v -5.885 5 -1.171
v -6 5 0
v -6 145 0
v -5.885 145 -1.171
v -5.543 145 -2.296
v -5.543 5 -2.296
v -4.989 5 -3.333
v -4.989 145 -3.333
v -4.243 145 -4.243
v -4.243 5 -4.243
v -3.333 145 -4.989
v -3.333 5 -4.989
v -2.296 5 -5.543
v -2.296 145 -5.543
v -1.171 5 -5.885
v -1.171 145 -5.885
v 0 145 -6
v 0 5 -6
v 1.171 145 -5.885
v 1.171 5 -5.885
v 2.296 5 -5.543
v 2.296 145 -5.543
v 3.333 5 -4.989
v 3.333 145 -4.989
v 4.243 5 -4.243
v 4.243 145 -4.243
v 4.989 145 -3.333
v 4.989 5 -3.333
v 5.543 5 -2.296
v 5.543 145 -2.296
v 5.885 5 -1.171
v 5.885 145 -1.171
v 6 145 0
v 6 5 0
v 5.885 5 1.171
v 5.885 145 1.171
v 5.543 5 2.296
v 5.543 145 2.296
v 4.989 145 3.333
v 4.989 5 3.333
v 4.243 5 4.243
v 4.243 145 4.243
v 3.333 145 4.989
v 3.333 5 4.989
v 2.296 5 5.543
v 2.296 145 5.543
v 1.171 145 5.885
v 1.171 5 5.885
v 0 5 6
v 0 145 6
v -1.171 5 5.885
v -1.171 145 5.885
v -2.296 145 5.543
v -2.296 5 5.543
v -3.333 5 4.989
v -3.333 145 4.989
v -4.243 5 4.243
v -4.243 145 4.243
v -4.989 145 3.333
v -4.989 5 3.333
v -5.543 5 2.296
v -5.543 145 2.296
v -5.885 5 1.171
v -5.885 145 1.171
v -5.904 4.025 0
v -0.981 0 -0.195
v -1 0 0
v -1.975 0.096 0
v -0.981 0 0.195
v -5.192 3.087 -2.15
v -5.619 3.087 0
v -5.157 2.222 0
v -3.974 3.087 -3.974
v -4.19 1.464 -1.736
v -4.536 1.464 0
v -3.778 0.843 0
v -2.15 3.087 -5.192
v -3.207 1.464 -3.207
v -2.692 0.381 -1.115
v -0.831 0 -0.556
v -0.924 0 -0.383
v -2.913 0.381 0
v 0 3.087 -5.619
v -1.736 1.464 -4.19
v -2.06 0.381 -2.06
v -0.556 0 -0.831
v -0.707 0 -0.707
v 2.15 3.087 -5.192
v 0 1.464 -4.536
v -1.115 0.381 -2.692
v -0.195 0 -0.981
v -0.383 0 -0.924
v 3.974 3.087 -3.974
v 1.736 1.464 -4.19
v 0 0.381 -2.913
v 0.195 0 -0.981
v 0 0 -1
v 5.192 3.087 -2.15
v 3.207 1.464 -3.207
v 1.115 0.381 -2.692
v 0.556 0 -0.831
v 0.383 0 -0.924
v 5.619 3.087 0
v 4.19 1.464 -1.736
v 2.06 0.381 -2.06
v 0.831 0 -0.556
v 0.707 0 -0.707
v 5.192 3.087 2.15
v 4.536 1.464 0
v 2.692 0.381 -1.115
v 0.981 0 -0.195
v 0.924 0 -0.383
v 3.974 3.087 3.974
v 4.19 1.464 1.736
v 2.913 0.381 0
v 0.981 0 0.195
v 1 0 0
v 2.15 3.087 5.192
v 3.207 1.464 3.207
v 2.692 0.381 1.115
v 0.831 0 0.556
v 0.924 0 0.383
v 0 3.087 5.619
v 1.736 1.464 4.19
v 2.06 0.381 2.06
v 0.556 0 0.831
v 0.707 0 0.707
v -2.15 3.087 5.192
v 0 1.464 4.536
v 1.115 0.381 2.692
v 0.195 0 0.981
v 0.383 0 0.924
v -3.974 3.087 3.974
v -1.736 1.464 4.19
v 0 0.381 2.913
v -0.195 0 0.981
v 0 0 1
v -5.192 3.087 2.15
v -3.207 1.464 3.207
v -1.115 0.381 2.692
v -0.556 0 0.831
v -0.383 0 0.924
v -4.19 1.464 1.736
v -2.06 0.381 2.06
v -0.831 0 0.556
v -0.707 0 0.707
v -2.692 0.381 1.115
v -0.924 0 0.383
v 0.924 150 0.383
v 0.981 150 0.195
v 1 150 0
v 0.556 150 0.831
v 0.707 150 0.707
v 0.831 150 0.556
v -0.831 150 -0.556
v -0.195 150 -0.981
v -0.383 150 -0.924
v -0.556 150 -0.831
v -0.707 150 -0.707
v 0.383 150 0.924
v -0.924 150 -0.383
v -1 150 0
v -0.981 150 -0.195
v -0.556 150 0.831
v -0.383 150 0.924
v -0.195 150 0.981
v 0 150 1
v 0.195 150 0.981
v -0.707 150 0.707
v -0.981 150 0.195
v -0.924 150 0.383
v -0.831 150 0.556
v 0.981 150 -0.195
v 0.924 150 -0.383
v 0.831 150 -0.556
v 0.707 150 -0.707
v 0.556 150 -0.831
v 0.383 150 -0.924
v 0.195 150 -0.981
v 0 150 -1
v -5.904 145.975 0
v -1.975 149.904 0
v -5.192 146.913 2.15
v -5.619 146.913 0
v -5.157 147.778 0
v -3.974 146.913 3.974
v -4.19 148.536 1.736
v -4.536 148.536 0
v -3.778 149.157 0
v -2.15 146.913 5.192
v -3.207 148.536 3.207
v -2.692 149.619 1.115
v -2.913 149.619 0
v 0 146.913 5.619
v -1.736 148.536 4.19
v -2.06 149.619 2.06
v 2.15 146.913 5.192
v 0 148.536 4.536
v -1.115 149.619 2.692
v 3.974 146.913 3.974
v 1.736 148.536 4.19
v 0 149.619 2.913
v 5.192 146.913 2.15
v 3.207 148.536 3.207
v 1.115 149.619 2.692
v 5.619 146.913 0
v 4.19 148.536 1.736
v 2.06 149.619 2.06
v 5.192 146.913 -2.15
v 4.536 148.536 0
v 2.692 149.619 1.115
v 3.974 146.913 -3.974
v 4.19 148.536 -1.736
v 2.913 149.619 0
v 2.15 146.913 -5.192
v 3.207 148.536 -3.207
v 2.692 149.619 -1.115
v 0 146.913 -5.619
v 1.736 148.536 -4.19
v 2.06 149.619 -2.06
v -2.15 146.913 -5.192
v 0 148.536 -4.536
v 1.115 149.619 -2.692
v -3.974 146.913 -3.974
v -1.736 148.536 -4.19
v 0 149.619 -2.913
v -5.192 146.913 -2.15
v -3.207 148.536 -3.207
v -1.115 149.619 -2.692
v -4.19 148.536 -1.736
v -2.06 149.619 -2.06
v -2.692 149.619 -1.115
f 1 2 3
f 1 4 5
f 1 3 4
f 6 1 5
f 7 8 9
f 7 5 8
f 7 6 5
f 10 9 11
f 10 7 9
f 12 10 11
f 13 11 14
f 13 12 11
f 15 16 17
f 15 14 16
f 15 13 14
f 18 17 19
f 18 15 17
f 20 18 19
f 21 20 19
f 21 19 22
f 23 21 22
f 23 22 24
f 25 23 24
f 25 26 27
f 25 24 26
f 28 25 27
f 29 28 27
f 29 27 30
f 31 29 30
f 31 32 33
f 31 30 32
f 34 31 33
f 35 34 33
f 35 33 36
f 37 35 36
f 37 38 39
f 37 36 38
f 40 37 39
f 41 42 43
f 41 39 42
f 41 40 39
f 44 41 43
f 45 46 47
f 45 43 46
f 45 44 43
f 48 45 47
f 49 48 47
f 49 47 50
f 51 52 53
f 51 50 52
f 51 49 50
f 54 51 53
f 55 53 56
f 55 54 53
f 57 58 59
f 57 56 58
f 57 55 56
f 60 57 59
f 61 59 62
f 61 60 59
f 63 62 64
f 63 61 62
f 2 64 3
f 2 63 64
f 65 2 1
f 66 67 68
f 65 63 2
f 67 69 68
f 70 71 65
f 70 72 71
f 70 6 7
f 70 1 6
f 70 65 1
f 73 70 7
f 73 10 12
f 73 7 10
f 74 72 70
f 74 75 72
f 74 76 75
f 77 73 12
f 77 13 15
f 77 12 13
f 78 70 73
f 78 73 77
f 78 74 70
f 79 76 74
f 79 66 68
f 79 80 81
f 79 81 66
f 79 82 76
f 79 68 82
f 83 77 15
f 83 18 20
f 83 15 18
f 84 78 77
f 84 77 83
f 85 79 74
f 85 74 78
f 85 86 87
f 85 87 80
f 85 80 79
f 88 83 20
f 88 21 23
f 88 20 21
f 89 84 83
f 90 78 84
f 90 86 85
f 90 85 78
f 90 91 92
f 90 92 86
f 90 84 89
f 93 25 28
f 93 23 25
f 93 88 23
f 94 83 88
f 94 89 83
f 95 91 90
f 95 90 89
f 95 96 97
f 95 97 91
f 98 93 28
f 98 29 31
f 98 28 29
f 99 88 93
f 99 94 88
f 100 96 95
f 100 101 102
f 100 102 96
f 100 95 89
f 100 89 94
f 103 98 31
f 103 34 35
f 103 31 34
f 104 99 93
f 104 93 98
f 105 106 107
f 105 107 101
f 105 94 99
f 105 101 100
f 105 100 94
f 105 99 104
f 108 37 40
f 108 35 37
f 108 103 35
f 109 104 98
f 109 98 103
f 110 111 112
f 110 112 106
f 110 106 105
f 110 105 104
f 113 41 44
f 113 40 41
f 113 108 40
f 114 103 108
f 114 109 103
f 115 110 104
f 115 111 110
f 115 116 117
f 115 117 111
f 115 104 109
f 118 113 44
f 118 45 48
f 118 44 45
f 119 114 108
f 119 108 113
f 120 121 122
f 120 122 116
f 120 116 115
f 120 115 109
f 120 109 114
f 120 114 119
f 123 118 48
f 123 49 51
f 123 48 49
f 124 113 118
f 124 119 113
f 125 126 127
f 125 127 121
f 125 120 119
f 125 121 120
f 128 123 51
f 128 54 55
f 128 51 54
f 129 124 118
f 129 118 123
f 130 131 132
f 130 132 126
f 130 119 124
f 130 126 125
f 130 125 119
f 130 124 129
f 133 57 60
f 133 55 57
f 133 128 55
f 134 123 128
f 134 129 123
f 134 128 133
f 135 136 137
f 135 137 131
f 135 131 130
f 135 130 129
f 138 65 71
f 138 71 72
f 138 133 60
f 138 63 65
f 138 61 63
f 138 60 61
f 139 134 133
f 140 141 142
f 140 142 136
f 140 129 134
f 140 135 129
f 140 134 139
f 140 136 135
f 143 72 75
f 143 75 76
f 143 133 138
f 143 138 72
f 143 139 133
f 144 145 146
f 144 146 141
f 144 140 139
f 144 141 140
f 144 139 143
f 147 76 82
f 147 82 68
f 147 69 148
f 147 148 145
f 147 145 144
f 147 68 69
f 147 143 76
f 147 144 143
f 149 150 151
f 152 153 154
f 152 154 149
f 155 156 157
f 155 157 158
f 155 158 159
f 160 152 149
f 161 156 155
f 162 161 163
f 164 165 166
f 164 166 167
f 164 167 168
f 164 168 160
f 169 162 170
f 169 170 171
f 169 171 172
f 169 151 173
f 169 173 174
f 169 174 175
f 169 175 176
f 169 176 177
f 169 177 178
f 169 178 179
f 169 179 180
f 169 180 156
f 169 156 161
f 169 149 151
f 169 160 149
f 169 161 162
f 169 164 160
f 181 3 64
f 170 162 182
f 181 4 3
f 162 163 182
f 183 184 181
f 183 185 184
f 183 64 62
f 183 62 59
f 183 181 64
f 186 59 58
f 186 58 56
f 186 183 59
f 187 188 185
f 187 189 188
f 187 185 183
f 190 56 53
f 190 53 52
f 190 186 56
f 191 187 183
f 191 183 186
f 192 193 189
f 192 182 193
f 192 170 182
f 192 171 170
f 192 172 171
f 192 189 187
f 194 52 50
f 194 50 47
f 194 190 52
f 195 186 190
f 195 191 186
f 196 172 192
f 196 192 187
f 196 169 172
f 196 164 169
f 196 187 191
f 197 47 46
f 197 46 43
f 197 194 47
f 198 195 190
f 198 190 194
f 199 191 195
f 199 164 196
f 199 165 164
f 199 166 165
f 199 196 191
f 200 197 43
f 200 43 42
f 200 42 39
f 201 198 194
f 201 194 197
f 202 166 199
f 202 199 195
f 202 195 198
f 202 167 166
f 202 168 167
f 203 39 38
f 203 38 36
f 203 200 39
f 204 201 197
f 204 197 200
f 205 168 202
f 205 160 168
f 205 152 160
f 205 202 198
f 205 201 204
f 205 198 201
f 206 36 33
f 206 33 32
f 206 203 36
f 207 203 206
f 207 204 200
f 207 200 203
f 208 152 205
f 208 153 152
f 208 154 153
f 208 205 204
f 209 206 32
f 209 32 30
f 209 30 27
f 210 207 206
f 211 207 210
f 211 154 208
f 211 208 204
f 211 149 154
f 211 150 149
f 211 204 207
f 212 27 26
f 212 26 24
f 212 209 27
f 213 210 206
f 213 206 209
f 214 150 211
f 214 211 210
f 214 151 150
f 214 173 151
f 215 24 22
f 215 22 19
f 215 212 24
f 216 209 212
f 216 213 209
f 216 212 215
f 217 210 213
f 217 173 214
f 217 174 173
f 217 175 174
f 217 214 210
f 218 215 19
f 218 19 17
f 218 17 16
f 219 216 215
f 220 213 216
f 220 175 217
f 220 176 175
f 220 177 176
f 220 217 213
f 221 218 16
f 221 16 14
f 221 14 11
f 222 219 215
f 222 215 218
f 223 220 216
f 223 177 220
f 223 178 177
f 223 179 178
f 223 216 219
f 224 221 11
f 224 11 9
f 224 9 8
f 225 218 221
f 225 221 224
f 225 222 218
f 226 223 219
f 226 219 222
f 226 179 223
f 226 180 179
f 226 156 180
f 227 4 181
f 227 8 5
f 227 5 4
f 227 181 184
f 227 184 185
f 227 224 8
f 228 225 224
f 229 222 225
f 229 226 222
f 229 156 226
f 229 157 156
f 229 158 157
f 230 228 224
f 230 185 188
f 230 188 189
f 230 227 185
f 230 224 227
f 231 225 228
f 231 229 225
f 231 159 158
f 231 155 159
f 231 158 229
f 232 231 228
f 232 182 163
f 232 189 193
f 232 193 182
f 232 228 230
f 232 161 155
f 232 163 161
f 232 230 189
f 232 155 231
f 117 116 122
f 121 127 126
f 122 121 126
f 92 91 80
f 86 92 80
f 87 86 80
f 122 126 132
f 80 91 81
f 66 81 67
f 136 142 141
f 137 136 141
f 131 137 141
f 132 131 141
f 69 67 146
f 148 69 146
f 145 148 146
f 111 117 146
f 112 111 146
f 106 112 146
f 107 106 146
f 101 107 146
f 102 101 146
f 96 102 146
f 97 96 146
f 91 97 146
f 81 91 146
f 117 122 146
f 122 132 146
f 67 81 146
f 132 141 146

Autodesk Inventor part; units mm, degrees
ref_plane "YZ Plane" through (0, 0, 0) normal (1, 0, 0) x (0, 1, 0)
ref_plane "XZ Plane" through (0, 0, 0) normal (0, 1, 0) x (-1, 0, 0)
ref_plane "XY Plane" through (0, 0, 0) normal (0, 0, 1) x (1, 0, 0)
sketch "Sketch1" plane through (0, 0, 0) normal (0, 1, 0) x (-1, 0, 0)
  circle A0 centre (0, 0) radius 6
  dimension "d0" = 12
extrude "Extrusion1" add sketch "Sketch1" along normal blind 150
fillet "Fillet1" radius 5 1 edges at (6, 150, 0)
fillet "Fillet2" radius 5 1 edges at (6, 0, 0)
thread "Thread1" size "M12x1" class "6g" standard "ANSI Metric M Profile" length 11
properties part number "Griff"
